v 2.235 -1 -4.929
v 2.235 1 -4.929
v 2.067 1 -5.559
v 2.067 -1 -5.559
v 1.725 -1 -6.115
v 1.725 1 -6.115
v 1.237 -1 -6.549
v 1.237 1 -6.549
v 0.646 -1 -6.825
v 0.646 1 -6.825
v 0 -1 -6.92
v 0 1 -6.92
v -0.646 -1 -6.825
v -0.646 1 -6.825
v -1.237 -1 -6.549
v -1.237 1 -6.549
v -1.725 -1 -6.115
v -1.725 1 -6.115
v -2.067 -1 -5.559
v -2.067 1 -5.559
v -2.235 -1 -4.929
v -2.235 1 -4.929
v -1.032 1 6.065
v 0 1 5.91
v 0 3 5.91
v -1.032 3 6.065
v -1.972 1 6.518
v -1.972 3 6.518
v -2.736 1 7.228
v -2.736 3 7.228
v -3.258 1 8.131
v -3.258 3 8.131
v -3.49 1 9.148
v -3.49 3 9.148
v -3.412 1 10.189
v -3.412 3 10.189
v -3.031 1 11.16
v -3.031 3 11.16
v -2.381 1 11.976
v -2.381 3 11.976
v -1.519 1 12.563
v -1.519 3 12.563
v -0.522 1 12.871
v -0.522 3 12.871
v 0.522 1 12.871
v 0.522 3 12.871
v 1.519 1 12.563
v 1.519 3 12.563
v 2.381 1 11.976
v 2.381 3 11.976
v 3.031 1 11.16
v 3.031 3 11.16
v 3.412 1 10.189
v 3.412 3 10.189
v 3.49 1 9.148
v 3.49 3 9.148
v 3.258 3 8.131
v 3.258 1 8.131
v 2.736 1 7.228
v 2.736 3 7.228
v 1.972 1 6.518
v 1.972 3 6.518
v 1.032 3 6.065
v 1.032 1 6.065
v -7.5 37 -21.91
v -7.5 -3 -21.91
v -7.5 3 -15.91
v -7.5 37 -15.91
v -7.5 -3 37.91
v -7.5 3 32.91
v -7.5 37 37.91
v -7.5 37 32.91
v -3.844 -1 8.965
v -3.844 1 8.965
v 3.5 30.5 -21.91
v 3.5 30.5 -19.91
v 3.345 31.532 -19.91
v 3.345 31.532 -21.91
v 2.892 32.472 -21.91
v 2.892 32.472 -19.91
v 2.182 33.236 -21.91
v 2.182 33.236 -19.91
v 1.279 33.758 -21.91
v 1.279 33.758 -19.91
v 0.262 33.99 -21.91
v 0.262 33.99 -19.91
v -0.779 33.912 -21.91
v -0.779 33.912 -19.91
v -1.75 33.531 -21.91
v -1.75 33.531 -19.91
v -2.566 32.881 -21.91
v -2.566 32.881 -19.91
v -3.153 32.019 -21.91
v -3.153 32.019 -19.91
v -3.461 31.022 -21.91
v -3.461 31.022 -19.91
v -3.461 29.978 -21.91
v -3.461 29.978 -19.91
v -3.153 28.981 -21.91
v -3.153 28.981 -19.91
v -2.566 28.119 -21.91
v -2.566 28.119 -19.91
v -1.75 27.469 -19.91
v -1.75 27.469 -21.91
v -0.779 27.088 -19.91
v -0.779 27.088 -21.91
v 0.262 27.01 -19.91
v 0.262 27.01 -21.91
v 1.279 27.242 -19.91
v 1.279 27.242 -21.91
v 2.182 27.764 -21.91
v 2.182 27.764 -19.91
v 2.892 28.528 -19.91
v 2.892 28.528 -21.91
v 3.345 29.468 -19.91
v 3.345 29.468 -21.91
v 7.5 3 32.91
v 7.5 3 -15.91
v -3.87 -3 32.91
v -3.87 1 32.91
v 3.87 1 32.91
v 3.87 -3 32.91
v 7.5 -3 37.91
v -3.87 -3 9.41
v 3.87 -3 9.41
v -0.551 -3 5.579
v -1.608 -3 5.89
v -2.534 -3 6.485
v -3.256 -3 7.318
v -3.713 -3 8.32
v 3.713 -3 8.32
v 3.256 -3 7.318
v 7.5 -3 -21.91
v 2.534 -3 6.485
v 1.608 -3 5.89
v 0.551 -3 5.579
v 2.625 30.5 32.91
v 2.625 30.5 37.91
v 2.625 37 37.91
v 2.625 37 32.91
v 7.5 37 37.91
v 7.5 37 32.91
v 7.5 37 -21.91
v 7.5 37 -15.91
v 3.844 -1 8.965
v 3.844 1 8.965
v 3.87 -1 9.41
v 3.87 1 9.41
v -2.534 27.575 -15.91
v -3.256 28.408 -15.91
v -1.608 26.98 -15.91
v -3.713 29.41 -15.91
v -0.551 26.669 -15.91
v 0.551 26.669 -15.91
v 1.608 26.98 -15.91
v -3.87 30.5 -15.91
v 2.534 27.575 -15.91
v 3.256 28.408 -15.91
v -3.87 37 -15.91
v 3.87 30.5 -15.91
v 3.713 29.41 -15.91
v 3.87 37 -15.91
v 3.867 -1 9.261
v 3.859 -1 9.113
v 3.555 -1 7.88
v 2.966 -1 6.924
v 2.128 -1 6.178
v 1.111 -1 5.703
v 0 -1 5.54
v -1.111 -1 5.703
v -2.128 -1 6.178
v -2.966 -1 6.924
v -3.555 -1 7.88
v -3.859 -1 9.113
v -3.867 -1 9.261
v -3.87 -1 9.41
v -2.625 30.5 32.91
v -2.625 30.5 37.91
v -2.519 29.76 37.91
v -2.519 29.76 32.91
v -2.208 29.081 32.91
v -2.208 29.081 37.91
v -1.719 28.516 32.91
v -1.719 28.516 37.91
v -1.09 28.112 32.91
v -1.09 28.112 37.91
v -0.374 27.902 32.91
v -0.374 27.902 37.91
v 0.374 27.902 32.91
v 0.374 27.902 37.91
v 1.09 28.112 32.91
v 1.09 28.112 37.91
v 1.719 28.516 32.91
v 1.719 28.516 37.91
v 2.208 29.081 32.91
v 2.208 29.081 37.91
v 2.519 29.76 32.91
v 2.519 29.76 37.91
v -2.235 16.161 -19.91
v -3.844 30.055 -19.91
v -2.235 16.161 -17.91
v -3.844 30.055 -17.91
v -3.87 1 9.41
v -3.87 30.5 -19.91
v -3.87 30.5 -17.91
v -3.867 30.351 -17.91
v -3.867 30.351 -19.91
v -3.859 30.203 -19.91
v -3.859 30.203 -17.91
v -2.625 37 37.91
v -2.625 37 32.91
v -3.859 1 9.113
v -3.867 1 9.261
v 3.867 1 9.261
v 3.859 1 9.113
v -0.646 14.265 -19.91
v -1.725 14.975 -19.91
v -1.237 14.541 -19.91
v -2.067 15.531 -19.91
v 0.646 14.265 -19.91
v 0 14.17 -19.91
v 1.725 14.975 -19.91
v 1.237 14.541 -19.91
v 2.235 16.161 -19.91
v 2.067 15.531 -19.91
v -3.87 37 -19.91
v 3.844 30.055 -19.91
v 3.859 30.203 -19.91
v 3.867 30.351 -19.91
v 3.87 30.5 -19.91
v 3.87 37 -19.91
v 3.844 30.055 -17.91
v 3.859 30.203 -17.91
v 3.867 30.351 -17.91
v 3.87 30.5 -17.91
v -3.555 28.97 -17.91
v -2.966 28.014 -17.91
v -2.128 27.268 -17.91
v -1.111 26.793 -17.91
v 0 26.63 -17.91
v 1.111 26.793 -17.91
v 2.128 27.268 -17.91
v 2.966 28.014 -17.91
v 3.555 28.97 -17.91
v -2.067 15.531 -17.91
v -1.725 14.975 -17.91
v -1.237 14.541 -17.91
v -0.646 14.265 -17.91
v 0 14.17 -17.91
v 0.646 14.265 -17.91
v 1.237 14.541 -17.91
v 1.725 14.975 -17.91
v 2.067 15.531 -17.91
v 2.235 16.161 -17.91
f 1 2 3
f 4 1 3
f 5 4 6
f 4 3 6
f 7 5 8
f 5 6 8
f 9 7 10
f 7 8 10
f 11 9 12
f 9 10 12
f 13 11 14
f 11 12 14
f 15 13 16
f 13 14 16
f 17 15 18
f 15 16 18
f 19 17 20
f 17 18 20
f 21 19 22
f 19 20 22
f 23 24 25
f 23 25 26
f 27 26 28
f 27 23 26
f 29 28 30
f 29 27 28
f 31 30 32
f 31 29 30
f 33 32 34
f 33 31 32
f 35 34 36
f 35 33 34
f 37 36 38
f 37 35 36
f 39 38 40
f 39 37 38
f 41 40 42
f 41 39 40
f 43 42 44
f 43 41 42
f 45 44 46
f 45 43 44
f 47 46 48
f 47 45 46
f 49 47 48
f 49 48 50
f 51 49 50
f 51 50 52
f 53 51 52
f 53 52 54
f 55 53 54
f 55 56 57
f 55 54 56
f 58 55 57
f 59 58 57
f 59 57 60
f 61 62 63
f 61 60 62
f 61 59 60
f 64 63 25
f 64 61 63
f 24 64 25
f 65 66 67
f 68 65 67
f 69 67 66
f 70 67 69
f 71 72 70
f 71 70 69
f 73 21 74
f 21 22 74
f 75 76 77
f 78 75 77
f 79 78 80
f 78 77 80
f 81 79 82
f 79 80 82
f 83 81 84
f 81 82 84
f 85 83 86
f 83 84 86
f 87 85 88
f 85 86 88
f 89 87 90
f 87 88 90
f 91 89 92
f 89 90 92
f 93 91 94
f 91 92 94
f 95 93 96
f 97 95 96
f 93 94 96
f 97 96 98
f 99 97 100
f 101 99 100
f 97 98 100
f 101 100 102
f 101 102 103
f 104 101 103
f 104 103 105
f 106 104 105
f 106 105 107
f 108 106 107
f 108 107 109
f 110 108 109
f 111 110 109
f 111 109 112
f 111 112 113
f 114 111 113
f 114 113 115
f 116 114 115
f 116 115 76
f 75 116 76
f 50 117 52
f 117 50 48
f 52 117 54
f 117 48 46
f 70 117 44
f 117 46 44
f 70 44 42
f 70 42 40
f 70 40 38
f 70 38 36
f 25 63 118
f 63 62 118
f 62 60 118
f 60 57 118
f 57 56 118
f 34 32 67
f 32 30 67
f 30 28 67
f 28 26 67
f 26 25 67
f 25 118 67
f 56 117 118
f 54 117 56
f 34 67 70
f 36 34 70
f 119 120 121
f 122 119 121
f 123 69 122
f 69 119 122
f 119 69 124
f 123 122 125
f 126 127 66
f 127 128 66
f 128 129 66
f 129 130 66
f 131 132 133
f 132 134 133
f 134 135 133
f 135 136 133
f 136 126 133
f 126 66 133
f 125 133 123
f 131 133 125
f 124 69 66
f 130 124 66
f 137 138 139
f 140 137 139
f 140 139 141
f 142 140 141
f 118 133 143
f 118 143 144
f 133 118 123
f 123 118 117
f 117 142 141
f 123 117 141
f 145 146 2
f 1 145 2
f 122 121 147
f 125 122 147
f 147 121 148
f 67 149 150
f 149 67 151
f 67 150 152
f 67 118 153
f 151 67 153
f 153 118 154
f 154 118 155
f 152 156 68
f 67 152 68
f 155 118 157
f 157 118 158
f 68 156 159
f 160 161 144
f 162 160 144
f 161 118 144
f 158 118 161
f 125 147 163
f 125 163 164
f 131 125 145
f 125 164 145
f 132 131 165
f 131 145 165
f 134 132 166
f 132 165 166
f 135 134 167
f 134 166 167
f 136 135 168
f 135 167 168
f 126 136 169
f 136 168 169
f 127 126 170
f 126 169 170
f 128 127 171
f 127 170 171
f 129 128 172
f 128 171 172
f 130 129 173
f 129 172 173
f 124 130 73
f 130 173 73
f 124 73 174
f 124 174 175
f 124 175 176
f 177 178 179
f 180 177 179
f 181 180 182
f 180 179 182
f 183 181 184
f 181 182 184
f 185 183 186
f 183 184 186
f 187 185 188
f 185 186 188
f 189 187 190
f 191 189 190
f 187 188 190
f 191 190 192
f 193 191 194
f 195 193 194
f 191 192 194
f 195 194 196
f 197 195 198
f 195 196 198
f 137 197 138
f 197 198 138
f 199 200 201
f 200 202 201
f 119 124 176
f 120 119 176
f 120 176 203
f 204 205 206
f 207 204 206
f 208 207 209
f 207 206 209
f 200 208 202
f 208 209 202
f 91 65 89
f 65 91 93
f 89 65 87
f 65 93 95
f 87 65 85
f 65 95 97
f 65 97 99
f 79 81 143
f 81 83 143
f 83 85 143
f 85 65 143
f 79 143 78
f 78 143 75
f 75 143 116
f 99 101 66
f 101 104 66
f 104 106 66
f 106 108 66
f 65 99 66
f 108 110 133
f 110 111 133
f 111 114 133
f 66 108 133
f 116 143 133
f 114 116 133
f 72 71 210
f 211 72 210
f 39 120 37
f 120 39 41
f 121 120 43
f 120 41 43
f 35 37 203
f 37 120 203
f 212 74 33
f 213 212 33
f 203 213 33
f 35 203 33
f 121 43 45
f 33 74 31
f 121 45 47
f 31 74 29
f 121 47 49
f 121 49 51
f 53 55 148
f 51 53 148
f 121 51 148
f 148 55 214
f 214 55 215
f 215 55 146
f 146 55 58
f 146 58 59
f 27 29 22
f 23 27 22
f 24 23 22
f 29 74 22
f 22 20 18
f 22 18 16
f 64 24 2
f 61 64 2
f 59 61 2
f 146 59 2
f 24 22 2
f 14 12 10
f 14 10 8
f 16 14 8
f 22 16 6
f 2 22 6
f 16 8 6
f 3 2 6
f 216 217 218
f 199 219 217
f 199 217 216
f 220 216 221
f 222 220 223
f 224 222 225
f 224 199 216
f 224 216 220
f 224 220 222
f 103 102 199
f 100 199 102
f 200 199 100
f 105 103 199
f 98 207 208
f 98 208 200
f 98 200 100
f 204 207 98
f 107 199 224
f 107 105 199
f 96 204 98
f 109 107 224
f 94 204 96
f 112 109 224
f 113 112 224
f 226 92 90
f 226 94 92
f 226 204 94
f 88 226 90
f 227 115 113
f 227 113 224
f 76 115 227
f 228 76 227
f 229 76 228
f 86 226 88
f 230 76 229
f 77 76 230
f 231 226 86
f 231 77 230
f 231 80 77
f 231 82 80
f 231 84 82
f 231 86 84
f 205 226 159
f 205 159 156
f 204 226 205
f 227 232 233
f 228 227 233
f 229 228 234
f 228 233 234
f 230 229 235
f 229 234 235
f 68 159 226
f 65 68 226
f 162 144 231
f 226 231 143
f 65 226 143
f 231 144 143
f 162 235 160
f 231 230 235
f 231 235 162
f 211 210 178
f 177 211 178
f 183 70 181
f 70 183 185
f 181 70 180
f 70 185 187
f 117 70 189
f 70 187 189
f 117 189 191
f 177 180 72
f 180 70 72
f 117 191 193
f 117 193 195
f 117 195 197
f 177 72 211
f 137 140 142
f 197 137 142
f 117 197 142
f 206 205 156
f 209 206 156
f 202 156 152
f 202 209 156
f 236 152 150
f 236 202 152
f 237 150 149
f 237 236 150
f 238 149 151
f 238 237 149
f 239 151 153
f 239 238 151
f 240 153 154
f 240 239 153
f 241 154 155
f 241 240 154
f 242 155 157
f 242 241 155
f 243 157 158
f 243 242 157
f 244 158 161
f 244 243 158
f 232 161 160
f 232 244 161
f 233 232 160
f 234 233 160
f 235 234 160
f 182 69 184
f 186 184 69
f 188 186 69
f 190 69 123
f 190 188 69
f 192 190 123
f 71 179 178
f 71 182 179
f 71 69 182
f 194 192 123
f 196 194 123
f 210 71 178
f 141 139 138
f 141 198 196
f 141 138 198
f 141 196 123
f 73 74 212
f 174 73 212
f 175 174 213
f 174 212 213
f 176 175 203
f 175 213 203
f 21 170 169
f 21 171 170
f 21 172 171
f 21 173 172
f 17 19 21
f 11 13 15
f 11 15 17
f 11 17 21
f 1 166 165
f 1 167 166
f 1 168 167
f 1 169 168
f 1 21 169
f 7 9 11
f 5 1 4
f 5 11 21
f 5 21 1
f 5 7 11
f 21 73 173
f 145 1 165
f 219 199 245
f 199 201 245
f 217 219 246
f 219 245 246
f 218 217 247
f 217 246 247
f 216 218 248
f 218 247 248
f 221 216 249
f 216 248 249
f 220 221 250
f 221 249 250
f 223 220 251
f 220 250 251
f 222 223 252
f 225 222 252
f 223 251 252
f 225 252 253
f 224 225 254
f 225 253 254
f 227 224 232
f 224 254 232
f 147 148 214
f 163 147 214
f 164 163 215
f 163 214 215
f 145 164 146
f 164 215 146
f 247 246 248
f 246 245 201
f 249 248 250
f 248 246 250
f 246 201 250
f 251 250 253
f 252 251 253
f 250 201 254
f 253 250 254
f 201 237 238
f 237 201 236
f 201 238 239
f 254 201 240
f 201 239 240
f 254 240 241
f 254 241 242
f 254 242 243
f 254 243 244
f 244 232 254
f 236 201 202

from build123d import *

# Parameters (mm, degrees)
BOSS_EXTRUDE1_DEPTH = 7.5
SKETCH2_R           = 3.5
CUT_EXTRUDE1_DEPTH  = 44.649720503
SKETCH6_R           = 3.5
CUT_EXTRUDE4_DEPTH  = 52.358372248
CUT_EXTRUDE5_DEPTH  = 1
CUT_EXTRUDE6_DEPTH  = 53.041544942
CUT_EXTRUDE7_DEPTH  = 1
CUT_EXTRUDE8_DEPTH  = 44.649720503
BOSS_EXTRUDE2_DEPTH = 22
BOSS_EXTRUDE3_START = -40
SKETCH12_W          = 15
SKETCH12_H          = 5
BOSS_EXTRUDE3_DEPTH = 40
CUT_EXTRUDE9_DEPTH  = 5


with BuildPart() as part:
    # Sketch1 → Boss-Extrude1 (new, symmetric)
    with BuildSketch(Plane(origin=(0, 0, 0), x_dir=(0, 0, -1), z_dir=(1, 0, 0))):
        Polygon((-15.91, -3), (-15.91, 3), (15.91, 3), (15.91, 37), (21.91, 37), (21.91, -3), align=None)
    extrude(amount=BOSS_EXTRUDE1_DEPTH, both=True)

    # Sketch2 → Cut-Extrude1 (cut, through all)
    with BuildSketch(Plane(origin=(0, 0, 0), x_dir=(1, 0, 0), z_dir=(0, 1, 0))):
        with Locations(Location((0, -9.41, 0), (0, 0, 90))):
            Circle(SKETCH2_R)
    extrude(amount=CUT_EXTRUDE1_DEPTH, mode=Mode.SUBTRACT)

    # Sketch6 → Cut-Extrude4 (cut, through all)
    with BuildSketch(Plane.XY.offset(-18.91)):
        with Locations((0, 30.5)):
            Circle(SKETCH6_R)
    extrude(amount=-CUT_EXTRUDE4_DEPTH, mode=Mode.SUBTRACT)

    # Sketch7 → Cut-Extrude5 (cut, symmetric)
    with BuildSketch(Plane.XY.offset(-18.91)):
        with BuildLine():
            Line((2.235057553, 16.161122159), (3.84429899, 30.054730114))
            ThreePointArc((3.84429899, 30.054730114), (3.863569405, 30.276994499), (3.87, 30.5))
            Line((3.87, 30.5), (3.87, 37))
            Line((3.87, 37), (-3.87, 37))
            Line((-3.87, 37), (-3.87, 30.5))
            ThreePointArc((-3.87, 30.5), (-3.863569405, 30.276994499), (-3.84429899, 30.054730114))
            Line((-3.84429899, 30.054730114), (-2.235057553, 16.161122159))
            ThreePointArc((-2.235057553, 16.161122159), (0, 14.17), (2.235057553, 16.161122159))
        make_face()
    extrude(amount=CUT_EXTRUDE5_DEPTH, both=True, mode=Mode.SUBTRACT)

    # Sketch8 → Cut-Extrude6 (cut, through all)
    with BuildSketch(Plane.XY.offset(-19.91)):
        with BuildLine():
            Line((3.87, 30.5), (3.87, 37))
            Line((3.87, 37), (-3.87, 37))
            Line((-3.87, 37), (-3.87, 30.5))
            ThreePointArc((-3.87, 30.5), (0, 26.63), (3.87, 30.5))
        make_face()
    extrude(amount=CUT_EXTRUDE6_DEPTH, mode=Mode.SUBTRACT)

    # Sketch9 → Cut-Extrude7 (cut, symmetric)
    with BuildSketch(Plane(origin=(0, 0, 0), x_dir=(1, 0, 0), z_dir=(0, 1, 0))):
        with BuildLine():
            Line((-3.87, -9.41), (-3.87, -15.91))
            Line((-3.87, -15.91), (3.87, -15.91))
            Line((3.87, -15.91), (3.87, -9.41))
            ThreePointArc((3.87, -9.41), (3.863569405, -9.186994499), (3.84429899, -8.964730114))
            Line((3.84429899, -8.964730114), (2.235057553, 4.928877841))
            ThreePointArc((2.235057553, 4.928877841), (0, 6.92), (-2.235057553, 4.928877841))
            Line((-2.235057553, 4.928877841), (-3.84429899, -8.964730114))
            ThreePointArc((-3.84429899, -8.964730114), (-3.863569405, -9.186994499), (-3.87, -9.41))
        make_face()
    extrude(amount=CUT_EXTRUDE7_DEPTH, both=True, mode=Mode.SUBTRACT)

    # Sketch10 → Cut-Extrude8 (cut, through all)
    with BuildSketch(Plane(origin=(0, 0, 0), x_dir=(1, 0, 0), z_dir=(0, 1, 0))):
        with BuildLine():
            Line((-3.87, -15.91), (3.87, -15.91))
            Line((3.87, -15.91), (3.87, -9.41))
            ThreePointArc((3.87, -9.41), (0, -5.54), (-3.87, -9.41))
            Line((-3.87, -9.41), (-3.87, -15.91))
        make_face()
    extrude(amount=-CUT_EXTRUDE8_DEPTH, mode=Mode.SUBTRACT)

    # Sketch11 → Boss-Extrude2 (add)
    with BuildSketch(Plane.XY.offset(15.91)):
        Polygon((-7.5, -3), (-3.87, -3), (-3.87, 1), (3.87, 1), (3.87, -3), (7.5, -3), (7.5, 3), (-7.5, 3), align=None)
    extrude(amount=BOSS_EXTRUDE2_DEPTH)

    # Sketch12 → Boss-Extrude3 (add)
    with BuildSketch(Plane.XZ.offset(3).offset(BOSS_EXTRUDE3_START)):
        with Locations((0, 35.41)):
            Rectangle(SKETCH12_W, SKETCH12_H)
    extrude(amount=BOSS_EXTRUDE3_DEPTH)

    # Sketch14 → Cut-Extrude9 (cut)
    with BuildSketch(Plane.XY.offset(37.91)):
        with BuildLine():
            Line((-2.625, 37), (-2.625, 30.5))
            ThreePointArc((-2.625, 30.5), (0, 27.875), (2.625, 30.5))
            Line((2.625, 30.5), (2.625, 37))
            Line((2.625, 37), (-2.625, 37))
        make_face()
    extrude(amount=-CUT_EXTRUDE9_DEPTH, mode=Mode.SUBTRACT)


solid = part.part
